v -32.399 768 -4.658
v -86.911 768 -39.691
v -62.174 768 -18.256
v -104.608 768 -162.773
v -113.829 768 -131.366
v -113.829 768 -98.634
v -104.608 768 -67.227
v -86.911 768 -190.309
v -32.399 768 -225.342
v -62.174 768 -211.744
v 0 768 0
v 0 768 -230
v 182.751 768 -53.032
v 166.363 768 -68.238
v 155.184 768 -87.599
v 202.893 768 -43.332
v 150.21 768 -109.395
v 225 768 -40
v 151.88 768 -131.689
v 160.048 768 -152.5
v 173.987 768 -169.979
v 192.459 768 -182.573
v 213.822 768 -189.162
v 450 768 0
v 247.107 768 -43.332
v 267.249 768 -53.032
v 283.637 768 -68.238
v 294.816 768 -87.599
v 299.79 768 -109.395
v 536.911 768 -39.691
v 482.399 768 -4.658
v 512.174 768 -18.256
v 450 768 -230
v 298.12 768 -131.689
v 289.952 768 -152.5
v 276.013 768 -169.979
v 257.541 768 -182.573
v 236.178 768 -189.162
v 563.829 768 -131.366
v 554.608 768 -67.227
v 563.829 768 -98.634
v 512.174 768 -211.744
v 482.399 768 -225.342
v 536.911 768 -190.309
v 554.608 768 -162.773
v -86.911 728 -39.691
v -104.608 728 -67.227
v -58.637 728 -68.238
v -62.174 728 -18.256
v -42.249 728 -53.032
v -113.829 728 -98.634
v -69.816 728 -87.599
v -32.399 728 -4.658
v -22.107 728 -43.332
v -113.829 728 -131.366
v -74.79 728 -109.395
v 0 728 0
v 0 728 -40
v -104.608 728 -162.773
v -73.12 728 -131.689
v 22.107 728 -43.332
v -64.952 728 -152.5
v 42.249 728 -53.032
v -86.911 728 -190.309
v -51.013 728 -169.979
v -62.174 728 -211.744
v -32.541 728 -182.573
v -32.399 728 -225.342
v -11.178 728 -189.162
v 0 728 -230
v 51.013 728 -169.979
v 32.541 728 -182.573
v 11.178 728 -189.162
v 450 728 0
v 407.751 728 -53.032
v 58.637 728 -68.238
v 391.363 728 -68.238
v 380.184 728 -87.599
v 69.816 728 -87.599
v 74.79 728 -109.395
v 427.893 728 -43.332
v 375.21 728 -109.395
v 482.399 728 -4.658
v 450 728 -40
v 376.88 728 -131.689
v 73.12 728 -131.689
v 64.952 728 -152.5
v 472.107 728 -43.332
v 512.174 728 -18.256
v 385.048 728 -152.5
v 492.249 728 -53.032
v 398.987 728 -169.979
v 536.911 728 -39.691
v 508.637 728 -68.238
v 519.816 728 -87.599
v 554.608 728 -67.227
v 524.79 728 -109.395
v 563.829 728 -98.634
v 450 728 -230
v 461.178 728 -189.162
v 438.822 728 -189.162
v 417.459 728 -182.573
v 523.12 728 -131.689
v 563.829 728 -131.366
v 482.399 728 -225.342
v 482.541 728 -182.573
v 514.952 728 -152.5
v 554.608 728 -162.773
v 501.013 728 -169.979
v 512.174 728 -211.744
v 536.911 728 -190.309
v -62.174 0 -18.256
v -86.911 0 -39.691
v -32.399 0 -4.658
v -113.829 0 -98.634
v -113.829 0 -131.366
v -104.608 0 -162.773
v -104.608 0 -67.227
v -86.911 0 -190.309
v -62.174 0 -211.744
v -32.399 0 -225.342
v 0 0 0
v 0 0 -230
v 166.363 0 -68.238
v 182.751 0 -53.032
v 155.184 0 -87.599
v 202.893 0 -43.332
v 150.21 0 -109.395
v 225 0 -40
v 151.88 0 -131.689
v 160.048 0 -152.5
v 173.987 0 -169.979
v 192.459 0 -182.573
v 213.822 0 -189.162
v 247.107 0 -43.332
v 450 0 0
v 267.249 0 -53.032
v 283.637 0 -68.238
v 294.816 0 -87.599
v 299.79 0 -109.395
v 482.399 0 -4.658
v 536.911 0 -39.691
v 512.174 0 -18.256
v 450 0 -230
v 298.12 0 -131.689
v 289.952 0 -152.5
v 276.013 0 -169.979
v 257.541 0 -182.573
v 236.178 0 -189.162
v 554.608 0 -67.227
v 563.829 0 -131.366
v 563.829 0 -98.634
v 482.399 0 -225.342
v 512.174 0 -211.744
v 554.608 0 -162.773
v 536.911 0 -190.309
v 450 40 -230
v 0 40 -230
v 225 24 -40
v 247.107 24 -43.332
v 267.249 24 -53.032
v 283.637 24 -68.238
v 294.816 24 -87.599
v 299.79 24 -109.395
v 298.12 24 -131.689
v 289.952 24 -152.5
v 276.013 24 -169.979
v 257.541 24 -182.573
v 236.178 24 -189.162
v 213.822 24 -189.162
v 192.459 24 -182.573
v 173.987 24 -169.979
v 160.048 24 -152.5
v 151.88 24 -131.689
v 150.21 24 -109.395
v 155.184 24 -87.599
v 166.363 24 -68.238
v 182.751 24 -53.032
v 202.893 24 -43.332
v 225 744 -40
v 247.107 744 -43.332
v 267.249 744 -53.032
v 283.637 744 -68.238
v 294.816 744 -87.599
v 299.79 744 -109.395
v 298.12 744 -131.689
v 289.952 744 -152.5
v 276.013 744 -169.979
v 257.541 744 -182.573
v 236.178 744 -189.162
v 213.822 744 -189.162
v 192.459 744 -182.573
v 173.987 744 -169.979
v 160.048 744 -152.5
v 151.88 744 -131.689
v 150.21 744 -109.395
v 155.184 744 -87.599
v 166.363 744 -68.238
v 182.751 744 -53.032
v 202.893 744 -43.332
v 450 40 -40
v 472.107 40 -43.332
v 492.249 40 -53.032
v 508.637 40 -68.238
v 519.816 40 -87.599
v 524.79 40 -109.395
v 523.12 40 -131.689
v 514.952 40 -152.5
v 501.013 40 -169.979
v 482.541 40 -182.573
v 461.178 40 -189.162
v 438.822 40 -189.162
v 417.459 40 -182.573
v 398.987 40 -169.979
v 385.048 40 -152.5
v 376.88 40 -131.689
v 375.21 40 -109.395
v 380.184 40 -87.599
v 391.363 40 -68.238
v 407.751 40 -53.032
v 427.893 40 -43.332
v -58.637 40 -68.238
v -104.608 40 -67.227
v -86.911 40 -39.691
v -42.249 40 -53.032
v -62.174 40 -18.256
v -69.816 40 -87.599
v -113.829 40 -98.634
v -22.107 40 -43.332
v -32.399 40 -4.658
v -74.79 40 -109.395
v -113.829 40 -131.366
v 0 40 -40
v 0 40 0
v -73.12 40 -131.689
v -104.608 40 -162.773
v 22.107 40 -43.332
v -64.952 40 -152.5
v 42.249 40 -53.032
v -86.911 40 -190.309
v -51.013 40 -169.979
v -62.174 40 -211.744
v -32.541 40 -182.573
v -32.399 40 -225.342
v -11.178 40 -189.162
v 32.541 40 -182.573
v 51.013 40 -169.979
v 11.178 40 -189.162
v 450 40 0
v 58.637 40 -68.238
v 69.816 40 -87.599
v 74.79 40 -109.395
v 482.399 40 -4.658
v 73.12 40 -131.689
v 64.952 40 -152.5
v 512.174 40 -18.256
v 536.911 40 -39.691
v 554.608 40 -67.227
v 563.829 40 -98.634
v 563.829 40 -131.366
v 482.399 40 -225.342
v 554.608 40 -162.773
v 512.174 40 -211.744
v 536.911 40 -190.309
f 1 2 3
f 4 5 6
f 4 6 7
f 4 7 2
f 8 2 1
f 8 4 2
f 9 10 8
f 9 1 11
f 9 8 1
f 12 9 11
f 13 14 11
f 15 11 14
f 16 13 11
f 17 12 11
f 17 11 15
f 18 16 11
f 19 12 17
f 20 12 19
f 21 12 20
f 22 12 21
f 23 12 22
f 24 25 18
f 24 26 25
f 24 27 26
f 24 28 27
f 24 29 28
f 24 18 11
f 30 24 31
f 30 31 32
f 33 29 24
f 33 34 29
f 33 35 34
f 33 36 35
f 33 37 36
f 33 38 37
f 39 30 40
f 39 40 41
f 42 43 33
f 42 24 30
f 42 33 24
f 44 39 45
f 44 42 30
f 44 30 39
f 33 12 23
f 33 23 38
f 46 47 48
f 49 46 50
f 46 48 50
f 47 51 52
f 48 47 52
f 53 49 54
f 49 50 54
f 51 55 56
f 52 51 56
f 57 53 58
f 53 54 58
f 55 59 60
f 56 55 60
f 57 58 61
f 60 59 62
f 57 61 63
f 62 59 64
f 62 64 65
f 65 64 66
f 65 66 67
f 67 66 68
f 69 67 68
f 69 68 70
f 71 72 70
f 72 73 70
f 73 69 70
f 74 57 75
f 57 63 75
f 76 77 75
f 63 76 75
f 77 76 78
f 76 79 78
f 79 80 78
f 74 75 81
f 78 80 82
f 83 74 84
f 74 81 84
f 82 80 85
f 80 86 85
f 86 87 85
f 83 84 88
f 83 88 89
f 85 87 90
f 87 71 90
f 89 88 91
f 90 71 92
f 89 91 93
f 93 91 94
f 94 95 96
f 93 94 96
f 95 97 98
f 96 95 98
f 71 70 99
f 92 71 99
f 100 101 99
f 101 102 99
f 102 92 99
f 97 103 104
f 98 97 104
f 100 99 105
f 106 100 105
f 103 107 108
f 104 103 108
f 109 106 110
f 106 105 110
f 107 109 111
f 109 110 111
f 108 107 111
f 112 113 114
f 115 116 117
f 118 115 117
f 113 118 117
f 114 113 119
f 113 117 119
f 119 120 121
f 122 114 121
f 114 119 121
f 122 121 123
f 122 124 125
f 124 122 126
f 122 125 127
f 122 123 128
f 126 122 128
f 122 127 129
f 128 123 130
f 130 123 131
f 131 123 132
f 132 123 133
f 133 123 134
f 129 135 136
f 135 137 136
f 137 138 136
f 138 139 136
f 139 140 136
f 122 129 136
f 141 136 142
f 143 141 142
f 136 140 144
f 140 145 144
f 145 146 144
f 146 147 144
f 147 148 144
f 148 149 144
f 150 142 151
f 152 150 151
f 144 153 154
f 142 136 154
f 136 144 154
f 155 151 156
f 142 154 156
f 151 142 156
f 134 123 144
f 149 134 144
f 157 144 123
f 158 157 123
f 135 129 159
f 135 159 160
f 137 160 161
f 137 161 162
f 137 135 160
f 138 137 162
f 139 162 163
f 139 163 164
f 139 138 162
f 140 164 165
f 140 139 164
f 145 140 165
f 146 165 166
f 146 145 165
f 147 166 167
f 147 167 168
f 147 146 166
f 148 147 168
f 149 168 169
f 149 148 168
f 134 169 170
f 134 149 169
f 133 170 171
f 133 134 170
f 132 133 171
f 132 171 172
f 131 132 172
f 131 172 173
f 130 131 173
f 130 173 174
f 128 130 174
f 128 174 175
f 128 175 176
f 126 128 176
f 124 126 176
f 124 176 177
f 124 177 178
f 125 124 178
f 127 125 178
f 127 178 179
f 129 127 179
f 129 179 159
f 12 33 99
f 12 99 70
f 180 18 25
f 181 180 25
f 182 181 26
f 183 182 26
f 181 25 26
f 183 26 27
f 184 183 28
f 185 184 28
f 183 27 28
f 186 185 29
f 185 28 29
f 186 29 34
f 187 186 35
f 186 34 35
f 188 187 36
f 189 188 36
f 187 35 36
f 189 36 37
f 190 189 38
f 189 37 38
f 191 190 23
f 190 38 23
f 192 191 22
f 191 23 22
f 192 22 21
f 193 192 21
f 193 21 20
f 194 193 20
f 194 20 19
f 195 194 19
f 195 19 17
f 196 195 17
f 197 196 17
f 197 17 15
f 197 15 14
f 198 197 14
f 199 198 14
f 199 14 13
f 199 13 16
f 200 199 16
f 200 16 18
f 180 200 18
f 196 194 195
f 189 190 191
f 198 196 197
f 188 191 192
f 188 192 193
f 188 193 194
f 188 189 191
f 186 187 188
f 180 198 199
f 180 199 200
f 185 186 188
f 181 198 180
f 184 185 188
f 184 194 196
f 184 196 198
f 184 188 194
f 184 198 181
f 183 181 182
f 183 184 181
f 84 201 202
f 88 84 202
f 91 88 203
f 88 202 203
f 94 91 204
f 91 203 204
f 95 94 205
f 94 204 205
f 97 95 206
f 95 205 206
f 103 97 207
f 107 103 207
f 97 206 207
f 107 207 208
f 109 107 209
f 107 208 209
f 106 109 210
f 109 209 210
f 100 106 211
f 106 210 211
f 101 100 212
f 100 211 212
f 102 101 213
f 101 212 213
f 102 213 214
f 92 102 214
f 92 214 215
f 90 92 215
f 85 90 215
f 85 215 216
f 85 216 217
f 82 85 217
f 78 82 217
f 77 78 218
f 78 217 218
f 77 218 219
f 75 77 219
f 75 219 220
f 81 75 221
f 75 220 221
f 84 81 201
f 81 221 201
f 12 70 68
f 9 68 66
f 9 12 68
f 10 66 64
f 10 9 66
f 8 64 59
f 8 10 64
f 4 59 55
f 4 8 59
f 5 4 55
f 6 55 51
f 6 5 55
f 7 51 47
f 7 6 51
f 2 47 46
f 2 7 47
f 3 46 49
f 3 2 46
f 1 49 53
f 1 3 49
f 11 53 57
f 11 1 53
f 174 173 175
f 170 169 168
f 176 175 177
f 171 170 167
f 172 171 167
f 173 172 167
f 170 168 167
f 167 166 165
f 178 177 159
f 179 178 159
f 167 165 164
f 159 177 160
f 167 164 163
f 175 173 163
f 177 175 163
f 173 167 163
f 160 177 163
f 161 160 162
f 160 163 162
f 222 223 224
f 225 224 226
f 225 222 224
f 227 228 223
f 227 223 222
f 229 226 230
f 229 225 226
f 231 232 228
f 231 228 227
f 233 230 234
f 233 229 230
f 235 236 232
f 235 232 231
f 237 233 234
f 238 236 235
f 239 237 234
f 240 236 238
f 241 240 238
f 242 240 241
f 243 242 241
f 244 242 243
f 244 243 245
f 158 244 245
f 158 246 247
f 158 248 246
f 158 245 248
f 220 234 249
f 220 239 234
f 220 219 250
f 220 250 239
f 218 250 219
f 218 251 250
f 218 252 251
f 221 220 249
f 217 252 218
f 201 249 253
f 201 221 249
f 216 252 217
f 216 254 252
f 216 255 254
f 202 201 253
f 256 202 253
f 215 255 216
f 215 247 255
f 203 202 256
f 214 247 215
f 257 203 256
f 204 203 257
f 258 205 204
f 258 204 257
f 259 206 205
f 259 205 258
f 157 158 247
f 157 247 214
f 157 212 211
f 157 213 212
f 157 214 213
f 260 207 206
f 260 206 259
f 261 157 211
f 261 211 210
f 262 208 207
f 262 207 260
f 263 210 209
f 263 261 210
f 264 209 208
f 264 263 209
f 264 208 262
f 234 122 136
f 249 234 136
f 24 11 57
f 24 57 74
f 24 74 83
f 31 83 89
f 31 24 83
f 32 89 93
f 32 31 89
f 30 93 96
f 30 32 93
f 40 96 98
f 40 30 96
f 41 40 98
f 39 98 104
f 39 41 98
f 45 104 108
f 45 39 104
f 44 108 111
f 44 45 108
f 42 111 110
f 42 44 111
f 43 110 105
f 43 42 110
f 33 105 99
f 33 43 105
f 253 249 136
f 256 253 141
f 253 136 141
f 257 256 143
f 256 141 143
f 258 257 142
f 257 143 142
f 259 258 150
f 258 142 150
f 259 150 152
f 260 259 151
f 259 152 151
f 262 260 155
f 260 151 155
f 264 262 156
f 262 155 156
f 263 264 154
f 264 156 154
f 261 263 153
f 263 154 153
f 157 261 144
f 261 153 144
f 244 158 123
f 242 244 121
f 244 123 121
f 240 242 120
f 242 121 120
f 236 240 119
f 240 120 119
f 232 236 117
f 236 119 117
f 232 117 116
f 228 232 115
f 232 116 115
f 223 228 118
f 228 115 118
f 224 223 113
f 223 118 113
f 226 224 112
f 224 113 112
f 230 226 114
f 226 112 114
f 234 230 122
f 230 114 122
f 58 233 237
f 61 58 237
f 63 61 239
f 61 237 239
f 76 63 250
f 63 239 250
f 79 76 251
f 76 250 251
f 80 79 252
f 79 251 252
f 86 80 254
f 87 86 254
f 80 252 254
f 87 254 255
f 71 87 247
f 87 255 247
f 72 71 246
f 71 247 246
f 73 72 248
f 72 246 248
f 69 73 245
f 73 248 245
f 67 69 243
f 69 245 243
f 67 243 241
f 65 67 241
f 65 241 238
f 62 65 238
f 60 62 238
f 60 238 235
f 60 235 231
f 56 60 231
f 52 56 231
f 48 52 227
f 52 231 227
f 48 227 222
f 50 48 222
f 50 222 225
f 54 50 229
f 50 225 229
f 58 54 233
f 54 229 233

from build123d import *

# Parameters (mm, degrees)
BOSS_EXTRUDE1_DEPTH = 40
SKETCH2_R           = 75
BOSS_EXTRUDE2_DEPTH = 688
SKETCH3_R           = 75
BOSS_EXTRUDE3_DEPTH = 1
SKETCH5_R           = 75
CUT_EXTRUDE1_DEPTH  = 25


with BuildPart() as part:
    # Sketch1 → Boss-Extrude1 (new body)
    with BuildSketch(Plane(origin=(0, 0, 0), x_dir=(1, 0, 0), z_dir=(0, 1, 0))):
        with BuildLine():
            Line((0, 0), (450, 0))
            ThreePointArc((450, 0), (565, 115), (450, 230))
            Line((450, 230), (0, 230))
            ThreePointArc((0, 230), (-115, 115), (0, 0))
        make_face()
    boss_extrude1 = extrude(amount=BOSS_EXTRUDE1_DEPTH)

    # Sketch2 → Boss-Extrude2 (add)
    with BuildSketch(Plane(origin=(0, 40, 0), x_dir=(1, 0, 0), z_dir=(0, 1, 0))):
        with Locations(Location((0, 115, 0), (0, 0, 270))):
            Circle(SKETCH2_R)
        with Locations(Location((450, 115, 0), (0, 0, 270))):
            Circle(SKETCH2_R)
    extrude(amount=BOSS_EXTRUDE2_DEPTH)

    # Mirror1: Boss-Extrude1 across plane
    add(boss_extrude1.mirror(Plane.ZX.offset(384)))

    # Sketch3 → Boss-Extrude3 (add)
    with BuildSketch(Plane(origin=(0, 768, 0), x_dir=(1, 0, 0), z_dir=(0, 1, 0))):
        with Locations(Location((225, 115, 0), (0, 0, 270))):
            Circle(SKETCH3_R)
    boss_extrude3 = extrude(amount=BOSS_EXTRUDE3_DEPTH)

    # Mirror2: Boss-Extrude3 across plane
    add(boss_extrude3.mirror(Plane.ZX.offset(384)))

    # Sketch5 → Cut-Extrude1 (cut)
    with BuildSketch(Plane(origin=(0, 769, 0), x_dir=(1, 0, 0), z_dir=(0, 1, 0))):
        with Locations(Location((225, 115, 0), (0, 0, 270))):
            Circle(SKETCH5_R)
    cut_extrude1 = extrude(amount=-CUT_EXTRUDE1_DEPTH, mode=Mode.SUBTRACT)

    # Mirror3: Cut-Extrude1 across plane
    add(cut_extrude1.mirror(Plane.ZX.offset(384)), mode=Mode.SUBTRACT)


solid = part.part
